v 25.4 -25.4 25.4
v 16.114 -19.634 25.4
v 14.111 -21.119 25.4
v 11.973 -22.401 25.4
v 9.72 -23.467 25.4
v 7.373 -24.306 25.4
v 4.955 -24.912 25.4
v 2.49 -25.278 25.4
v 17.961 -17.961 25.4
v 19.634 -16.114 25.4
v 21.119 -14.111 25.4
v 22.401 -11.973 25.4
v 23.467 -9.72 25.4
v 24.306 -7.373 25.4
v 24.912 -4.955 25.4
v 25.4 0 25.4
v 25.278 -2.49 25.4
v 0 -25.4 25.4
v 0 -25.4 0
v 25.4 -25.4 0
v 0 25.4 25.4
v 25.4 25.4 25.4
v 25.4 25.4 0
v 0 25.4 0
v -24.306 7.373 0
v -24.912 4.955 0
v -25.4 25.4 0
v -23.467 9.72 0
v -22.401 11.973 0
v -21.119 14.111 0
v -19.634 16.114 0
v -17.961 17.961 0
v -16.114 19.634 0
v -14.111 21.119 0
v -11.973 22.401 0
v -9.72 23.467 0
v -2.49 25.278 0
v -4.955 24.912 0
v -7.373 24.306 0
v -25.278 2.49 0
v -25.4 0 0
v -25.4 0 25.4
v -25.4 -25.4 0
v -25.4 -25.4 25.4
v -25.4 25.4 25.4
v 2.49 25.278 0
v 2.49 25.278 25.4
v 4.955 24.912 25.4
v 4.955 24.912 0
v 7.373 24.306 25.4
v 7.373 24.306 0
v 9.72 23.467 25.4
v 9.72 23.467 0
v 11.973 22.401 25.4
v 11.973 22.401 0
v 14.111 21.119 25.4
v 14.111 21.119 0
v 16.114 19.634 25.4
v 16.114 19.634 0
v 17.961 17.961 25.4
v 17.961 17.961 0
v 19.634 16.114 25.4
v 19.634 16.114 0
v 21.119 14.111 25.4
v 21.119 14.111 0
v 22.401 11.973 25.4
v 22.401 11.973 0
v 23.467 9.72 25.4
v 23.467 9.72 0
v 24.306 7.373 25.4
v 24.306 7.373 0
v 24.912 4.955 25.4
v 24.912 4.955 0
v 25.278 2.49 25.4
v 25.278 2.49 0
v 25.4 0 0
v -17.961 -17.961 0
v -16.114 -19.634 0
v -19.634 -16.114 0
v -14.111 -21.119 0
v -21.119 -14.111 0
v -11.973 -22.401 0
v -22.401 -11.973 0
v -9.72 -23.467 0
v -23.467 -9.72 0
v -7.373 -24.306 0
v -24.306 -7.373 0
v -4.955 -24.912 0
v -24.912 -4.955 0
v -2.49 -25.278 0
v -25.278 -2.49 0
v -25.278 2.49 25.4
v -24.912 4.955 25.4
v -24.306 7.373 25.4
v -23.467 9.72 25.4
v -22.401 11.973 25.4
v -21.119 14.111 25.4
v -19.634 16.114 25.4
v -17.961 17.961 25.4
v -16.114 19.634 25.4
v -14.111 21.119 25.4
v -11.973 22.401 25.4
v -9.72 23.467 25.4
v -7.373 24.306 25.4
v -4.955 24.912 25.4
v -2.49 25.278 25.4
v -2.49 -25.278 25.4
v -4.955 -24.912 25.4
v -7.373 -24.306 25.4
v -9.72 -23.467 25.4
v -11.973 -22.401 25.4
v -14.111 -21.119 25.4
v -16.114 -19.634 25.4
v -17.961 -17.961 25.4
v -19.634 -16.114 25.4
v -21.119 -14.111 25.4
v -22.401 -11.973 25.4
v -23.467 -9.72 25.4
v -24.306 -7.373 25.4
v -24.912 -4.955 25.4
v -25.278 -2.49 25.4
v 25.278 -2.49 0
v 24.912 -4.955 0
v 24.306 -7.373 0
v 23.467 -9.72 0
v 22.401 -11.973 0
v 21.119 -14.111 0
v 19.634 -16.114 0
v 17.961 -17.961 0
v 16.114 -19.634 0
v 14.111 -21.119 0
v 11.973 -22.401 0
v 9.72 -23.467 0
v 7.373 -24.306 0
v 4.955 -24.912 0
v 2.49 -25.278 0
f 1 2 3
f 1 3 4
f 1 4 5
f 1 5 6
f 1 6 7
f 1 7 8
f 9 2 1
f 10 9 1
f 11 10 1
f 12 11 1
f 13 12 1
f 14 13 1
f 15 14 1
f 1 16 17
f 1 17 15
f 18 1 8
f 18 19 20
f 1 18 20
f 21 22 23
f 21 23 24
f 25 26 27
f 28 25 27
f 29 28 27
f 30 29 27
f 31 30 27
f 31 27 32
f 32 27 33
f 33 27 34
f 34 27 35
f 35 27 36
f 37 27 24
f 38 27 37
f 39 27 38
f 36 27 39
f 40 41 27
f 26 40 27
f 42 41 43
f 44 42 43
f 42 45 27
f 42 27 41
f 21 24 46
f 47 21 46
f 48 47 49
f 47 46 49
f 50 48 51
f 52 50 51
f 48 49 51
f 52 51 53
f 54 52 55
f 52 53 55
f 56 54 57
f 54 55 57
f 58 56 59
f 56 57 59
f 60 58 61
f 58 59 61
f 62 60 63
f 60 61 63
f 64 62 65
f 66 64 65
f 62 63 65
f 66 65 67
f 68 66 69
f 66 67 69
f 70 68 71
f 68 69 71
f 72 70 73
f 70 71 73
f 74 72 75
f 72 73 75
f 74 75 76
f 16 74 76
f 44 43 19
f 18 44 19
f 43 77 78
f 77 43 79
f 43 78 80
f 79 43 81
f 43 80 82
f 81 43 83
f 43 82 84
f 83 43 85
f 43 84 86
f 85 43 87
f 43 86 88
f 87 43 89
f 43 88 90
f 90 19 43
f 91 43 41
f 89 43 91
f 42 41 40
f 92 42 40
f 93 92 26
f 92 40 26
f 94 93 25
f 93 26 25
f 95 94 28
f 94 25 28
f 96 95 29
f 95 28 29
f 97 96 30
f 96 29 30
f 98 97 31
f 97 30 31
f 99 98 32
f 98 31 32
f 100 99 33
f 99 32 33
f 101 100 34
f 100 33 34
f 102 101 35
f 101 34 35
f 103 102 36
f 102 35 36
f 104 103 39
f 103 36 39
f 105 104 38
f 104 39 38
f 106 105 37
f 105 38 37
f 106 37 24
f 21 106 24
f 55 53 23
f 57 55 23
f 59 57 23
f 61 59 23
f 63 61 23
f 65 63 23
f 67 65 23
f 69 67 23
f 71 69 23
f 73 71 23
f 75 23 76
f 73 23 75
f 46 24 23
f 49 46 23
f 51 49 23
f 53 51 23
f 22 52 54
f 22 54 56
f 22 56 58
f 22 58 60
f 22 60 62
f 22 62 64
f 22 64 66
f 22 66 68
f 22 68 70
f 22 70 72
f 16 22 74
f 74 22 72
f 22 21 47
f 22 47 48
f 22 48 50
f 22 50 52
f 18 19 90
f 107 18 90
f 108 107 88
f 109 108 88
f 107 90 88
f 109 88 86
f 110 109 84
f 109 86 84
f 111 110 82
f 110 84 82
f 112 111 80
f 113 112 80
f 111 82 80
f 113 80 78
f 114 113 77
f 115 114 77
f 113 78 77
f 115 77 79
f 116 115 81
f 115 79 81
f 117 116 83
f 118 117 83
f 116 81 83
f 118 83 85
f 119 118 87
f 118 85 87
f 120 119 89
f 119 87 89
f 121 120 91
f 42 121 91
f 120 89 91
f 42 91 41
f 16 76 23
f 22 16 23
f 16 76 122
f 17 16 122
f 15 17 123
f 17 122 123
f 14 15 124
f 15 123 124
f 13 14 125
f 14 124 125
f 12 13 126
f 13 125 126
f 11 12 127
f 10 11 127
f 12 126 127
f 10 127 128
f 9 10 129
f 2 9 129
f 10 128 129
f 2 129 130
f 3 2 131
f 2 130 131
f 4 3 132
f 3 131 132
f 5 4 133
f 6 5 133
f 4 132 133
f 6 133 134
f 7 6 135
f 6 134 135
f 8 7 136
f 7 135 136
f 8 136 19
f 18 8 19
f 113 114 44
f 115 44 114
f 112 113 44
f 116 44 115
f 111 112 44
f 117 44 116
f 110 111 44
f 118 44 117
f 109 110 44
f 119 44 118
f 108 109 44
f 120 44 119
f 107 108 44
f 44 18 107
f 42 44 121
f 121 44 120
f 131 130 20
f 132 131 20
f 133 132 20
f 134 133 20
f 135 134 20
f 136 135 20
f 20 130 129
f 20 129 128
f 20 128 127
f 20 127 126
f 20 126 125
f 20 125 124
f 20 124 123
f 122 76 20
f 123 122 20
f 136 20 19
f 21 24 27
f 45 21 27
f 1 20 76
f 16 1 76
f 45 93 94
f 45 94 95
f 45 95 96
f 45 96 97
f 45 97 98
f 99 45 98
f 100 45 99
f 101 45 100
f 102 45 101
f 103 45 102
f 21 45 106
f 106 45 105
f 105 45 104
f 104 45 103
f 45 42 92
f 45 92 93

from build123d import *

# Parameters (mm, degrees)
F1_DEPTH = 25.4


with BuildPart() as f1:
    # F0 (on Top) → F1 (new body)
    with BuildSketch(Plane.XY):
        with BuildLine():
            ThreePointArc((4.89e-08, 25.4), (17.9605122594, 17.9605122249), (25.4, 0))
            Line((25.4, 0), (25.4, 25.4))
            Line((25.4, 25.4), (4.89e-08, 25.4))
        make_face()
    extrude(amount=F1_DEPTH)


with BuildPart() as f1b:
    # F0 (on Top) → F1, piece 2 (new body)
    with BuildSketch(Plane.XY):
        with BuildLine():
            ThreePointArc((-25.4, 3.44e-08), (-17.9605122127, 17.9605122716), (4.89e-08, 25.4))
            Line((4.89e-08, 25.4), (-25.4, 25.4))
            Line((-25.4, 25.4), (-25.4, 3.44e-08))
        make_face()
    extrude(amount=F1_DEPTH)


with BuildPart() as f1c:
    # F0 (on Top) → F1, piece 3 (new body)
    with BuildSketch(Plane.XY):
        with BuildLine():
            Line((-25.4, -25.4), (3.01e-08, -25.4))
            ThreePointArc((3.01e-08, -25.4), (-17.9605122437, -17.9605122406), (-25.4, 3.44e-08))
            Line((-25.4, 3.44e-08), (-25.4, -25.4))
        make_face()
    extrude(amount=F1_DEPTH)


with BuildPart() as f1d:
    # F0 (on Top) → F1, piece 4 (new body)
    with BuildSketch(Plane.XY):
        with BuildLine():
            Line((25.4, -25.4), (25.4, 0))
            ThreePointArc((25.4, 0), (17.9605122528, -17.9605122315), (3.01e-08, -25.4))
            Line((3.01e-08, -25.4), (25.4, -25.4))
        make_face()
    extrude(amount=F1_DEPTH)


solid = Compound([f1.part, f1b.part, f1c.part, f1d.part])
